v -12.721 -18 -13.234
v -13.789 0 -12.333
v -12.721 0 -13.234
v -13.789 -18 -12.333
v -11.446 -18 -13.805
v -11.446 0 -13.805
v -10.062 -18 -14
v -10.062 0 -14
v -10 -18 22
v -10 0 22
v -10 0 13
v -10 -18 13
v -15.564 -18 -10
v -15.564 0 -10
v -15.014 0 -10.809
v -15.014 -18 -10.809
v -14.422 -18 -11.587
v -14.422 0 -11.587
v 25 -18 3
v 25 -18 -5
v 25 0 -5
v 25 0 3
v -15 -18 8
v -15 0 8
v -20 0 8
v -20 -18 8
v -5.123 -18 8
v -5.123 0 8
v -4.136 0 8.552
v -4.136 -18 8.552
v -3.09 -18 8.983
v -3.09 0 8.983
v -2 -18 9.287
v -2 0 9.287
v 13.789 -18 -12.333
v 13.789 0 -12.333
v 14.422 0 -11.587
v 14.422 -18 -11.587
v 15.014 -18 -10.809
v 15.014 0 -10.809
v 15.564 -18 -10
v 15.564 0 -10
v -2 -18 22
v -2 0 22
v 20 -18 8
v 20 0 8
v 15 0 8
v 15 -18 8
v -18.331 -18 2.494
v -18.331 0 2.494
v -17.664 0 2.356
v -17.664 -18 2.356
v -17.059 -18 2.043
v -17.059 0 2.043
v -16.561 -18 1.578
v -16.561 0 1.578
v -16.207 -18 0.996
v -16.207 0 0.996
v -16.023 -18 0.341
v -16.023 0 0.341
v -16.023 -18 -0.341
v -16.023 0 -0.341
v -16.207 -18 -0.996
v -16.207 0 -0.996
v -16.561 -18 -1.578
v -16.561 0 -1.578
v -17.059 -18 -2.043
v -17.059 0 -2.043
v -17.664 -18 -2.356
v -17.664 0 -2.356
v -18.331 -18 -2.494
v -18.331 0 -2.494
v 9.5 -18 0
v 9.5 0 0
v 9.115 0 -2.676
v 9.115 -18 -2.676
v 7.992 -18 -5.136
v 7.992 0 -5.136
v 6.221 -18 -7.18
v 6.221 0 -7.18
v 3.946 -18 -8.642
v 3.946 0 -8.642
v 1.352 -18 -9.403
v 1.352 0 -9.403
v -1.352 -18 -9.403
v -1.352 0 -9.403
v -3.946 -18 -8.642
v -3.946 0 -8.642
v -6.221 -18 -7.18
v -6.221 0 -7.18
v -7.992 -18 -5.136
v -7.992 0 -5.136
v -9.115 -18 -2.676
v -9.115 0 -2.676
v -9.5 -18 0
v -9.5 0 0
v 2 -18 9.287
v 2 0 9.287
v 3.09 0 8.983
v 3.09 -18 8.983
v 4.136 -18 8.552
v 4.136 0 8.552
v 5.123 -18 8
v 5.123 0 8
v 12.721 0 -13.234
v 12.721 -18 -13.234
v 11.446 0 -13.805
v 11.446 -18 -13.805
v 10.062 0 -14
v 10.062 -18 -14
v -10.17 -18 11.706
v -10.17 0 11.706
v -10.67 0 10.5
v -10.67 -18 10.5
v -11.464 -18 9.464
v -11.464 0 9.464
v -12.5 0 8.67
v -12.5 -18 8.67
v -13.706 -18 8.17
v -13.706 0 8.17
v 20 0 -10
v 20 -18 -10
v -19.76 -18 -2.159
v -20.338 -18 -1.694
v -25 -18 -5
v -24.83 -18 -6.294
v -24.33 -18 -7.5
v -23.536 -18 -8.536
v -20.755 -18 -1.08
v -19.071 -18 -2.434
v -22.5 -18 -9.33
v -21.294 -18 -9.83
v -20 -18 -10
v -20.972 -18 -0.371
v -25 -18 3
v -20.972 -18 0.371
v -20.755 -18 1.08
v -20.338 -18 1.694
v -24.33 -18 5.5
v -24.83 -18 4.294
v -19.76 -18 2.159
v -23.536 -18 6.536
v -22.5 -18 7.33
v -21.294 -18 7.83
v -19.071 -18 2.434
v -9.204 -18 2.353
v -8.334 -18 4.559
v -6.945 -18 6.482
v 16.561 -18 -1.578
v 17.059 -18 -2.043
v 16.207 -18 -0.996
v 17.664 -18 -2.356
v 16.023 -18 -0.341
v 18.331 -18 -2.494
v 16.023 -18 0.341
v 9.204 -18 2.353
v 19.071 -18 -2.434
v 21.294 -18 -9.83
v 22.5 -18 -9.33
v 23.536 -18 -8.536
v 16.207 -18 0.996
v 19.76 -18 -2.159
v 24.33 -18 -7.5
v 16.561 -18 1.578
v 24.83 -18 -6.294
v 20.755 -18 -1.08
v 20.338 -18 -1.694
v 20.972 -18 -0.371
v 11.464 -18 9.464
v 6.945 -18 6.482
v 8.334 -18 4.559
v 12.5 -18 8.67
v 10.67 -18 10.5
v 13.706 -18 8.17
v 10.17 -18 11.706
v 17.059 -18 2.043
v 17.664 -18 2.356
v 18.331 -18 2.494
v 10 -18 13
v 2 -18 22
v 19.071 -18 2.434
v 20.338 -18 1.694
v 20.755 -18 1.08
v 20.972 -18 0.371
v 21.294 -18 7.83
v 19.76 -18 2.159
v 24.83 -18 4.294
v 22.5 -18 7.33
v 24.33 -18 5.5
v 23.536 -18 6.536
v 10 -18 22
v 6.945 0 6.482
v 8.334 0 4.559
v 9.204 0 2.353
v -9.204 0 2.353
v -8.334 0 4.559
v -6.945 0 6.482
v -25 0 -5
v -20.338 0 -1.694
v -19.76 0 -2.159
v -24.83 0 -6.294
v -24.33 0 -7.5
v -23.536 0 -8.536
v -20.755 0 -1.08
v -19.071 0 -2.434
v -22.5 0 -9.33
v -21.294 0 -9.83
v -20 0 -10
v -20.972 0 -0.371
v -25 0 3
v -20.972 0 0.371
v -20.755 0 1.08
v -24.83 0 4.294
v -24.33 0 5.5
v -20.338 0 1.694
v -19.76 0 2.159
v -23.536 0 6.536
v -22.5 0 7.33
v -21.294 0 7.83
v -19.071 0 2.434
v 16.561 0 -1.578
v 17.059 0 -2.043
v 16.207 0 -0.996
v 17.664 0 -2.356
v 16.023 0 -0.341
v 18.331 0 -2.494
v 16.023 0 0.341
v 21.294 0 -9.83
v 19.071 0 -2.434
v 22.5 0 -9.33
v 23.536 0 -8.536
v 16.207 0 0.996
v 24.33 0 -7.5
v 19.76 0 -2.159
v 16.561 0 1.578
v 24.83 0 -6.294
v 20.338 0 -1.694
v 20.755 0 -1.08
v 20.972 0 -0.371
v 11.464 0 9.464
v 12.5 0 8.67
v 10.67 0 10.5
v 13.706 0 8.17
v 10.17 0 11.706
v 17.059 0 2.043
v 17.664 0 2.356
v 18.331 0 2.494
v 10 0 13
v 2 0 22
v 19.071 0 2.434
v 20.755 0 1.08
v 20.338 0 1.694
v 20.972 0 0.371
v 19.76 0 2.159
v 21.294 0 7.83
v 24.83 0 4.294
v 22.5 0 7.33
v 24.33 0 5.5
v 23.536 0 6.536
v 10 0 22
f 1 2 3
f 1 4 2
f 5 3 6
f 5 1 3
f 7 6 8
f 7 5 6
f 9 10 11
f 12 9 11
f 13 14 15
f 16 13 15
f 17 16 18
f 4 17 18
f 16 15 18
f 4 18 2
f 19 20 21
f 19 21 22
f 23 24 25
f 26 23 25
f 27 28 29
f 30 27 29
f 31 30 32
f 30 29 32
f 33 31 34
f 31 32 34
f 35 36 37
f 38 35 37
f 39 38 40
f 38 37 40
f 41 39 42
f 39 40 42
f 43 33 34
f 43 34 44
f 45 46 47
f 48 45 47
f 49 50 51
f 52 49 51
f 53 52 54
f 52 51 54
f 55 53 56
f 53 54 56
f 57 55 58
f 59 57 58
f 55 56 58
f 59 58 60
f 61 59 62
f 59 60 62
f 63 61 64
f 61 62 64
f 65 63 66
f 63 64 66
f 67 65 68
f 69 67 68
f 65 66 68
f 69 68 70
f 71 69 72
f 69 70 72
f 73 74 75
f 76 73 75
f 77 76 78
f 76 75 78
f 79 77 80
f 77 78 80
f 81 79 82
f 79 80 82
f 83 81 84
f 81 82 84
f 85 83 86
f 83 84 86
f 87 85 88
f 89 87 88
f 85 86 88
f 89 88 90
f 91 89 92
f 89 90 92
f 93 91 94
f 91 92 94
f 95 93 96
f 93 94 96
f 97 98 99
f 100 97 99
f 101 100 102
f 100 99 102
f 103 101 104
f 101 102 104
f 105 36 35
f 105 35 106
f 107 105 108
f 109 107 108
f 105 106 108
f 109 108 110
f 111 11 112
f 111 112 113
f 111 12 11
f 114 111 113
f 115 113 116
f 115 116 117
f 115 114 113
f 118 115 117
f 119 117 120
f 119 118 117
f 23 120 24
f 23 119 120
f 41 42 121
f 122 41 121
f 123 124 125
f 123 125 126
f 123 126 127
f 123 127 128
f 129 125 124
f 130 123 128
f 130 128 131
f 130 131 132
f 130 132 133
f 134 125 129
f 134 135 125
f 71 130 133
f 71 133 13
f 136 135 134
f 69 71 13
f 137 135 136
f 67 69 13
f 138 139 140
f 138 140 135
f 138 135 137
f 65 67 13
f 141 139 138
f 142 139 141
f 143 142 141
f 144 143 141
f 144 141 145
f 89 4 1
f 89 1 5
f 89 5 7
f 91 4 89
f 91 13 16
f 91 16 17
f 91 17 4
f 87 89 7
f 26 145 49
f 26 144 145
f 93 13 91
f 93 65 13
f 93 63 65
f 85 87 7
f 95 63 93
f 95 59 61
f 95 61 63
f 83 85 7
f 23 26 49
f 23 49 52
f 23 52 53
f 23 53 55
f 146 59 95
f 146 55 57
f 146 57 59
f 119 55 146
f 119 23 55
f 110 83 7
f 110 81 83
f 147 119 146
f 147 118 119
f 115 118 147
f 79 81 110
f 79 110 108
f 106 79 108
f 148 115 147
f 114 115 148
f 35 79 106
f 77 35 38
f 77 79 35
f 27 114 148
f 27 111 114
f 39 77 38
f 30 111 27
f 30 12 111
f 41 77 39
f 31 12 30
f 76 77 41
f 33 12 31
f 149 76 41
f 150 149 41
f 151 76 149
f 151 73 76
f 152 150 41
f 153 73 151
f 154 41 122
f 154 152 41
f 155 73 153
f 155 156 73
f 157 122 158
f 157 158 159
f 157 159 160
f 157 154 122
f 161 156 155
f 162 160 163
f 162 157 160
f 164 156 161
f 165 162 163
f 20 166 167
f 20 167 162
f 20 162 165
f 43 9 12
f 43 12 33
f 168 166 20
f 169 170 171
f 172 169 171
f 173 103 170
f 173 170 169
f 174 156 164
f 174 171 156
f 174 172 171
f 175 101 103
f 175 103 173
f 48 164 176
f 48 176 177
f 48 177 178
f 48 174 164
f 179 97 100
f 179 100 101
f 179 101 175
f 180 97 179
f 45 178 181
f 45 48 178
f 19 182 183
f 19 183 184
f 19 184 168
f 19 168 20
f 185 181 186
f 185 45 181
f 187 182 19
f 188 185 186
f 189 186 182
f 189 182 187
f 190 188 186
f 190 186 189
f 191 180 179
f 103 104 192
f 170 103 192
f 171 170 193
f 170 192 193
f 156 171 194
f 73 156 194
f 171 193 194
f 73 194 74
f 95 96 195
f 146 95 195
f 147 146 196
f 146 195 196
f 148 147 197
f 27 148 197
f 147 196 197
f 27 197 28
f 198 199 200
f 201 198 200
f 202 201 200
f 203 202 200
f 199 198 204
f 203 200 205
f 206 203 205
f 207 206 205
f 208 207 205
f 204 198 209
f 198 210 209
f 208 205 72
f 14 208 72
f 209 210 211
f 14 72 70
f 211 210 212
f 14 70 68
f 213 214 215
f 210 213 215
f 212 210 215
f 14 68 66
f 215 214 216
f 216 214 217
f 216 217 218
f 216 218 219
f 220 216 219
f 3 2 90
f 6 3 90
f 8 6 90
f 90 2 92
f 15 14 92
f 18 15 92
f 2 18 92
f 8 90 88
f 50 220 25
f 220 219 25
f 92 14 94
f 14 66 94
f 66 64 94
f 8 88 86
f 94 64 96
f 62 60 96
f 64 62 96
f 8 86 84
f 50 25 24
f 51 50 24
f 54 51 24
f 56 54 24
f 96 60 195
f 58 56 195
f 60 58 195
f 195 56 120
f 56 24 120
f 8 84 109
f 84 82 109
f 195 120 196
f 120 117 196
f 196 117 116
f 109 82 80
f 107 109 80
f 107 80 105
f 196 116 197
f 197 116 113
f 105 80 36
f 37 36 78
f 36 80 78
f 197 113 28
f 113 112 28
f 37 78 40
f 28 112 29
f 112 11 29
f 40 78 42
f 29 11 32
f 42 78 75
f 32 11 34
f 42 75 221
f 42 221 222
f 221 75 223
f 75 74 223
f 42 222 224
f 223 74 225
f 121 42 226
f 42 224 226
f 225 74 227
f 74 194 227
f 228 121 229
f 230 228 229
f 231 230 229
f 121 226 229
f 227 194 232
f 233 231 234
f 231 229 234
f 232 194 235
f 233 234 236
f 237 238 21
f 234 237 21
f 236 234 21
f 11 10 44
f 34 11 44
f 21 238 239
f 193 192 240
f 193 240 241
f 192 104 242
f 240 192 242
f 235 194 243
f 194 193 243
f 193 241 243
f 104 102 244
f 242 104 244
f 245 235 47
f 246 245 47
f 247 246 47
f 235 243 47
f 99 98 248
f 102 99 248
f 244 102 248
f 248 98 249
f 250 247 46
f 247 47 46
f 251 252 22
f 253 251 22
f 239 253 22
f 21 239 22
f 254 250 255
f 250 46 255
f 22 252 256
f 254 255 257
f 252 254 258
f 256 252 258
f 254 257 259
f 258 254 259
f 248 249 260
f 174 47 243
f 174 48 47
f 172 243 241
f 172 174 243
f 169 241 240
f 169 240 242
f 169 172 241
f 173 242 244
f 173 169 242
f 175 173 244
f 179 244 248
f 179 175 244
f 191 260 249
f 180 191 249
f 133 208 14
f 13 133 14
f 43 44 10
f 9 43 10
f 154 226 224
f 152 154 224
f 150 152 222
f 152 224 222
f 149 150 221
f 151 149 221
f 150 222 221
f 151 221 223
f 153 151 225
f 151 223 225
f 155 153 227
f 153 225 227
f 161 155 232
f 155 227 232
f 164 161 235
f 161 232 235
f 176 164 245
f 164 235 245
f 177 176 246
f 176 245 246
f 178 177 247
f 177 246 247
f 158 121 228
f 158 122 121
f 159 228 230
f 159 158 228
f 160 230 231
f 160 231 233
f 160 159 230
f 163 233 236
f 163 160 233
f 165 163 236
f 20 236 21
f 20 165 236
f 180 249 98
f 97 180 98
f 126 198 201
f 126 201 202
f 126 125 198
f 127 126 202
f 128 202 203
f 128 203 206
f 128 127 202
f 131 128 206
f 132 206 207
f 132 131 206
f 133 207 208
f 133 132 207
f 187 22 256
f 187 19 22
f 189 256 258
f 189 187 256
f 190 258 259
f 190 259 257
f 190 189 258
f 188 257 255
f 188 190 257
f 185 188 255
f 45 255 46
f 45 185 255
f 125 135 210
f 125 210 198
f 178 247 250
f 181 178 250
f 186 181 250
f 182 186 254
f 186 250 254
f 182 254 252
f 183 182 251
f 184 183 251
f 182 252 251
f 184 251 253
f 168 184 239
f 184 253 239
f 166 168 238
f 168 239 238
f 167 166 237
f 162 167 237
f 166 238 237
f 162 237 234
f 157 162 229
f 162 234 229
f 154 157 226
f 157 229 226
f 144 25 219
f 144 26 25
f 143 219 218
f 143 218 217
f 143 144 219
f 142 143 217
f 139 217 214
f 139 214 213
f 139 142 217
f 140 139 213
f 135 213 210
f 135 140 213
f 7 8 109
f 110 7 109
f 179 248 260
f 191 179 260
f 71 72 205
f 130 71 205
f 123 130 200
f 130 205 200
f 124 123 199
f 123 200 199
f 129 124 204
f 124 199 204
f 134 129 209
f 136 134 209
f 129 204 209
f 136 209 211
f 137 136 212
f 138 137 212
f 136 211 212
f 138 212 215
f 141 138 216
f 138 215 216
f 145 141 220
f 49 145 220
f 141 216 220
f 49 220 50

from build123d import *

# Parameters (mm, degrees)
F1_DEPTH = 18
F2_R     = 5


with BuildPart() as f1:
    # F0 (on Front) → F1 (new body)
    with BuildSketch(Plane.XZ):
        with BuildLine():
            ThreePointArc((12.0933866224, -14), (13.9727608958, -12.1248485743), (15.5643824163, -10))
            Line((15.5643824163, -10), (-15.5643824163, -10))
            ThreePointArc((-15.5643824163, -10), (-13.9727608958, -12.1248485743), (-12.0933866224, -14))
            Line((-12.0933866224, -14), (12.0933866224, -14))
        make_face()
        with BuildLine():
            Line((25, 8), (16.6808273176, 8))
            ThreePointArc((16.6808273176, 8), (17.7210793132, 5.311623855), (18.3310810811, 2.4942867515))
            ThreePointArc((18.3310810811, 2.4942867515), (20.2070006887, 1.8265127015), (21, 0))
            ThreePointArc((21, 0), (20.2070006887, -1.8265127015), (18.3310810811, -2.4942867515))
            ThreePointArc((18.3310810811, -2.4942867515), (17.358270198, -6.3984729219), (15.5643824163, -10))
            Line((15.5643824163, -10), (25, -10))
            Line((25, -10), (25, 8))
        make_face()
        with BuildLine():
            Line((2, 22), (2, 18.3915741577))
            ThreePointArc((2, 18.3915741577), (6.1642723241, 17.4428136123), (10, 15.5643824163))
            Line((10, 15.5643824163), (10, 22))
            Line((10, 22), (2, 22))
        make_face()
        with BuildLine():
            ThreePointArc((-10, 15.5643824163), (-6.1642723241, 17.4428136123), (-2, 18.3915741577))
            Line((-2, 18.3915741577), (-2, 22))
            Line((-2, 22), (-10, 22))
            Line((-10, 22), (-10, 15.5643824163))
        make_face()
        with BuildLine():
            ThreePointArc((-18.3310810811, 2.4942867515), (-17.7210793132, 5.311623855), (-16.6808273176, 8))
            Line((-16.6808273176, 8), (-25, 8))
            Line((-25, 8), (-25, -10))
            Line((-25, -10), (-15.5643824163, -10))
            ThreePointArc((-15.5643824163, -10), (-17.358270198, -6.3984729219), (-18.3310810811, -2.4942867515))
            ThreePointArc((-18.3310810811, -2.4942867515), (-21, 0), (-18.3310810811, 2.4942867515))
        make_face()
        with BuildLine():
            ThreePointArc((2, 9.2870878105), (3.6194093636, 8.7835002054), (5.123475383, 8))
            Line((5.123475383, 8), (10, 8))
            Line((10, 8), (10, 15.5643824163))
            ThreePointArc((10, 15.5643824163), (6.1642723241, 17.4428136123), (2, 18.3915741577))
            Line((2, 18.3915741577), (2, 9.2870878105))
        make_face()
        with BuildLine():
            Line((-10, 8), (-5.123475383, 8))
            ThreePointArc((-5.123475383, 8), (-3.6194093636, 8.7835002054), (-2, 9.2870878105))
            Line((-2, 9.2870878105), (-2, 18.3915741577))
            ThreePointArc((-2, 18.3915741577), (-6.1642723241, 17.4428136123), (-10, 15.5643824163))
            Line((-10, 15.5643824163), (-10, 8))
        make_face()
        with BuildLine():
            Line((10, 0), (9.5, 0))
            ThreePointArc((9.5, 0), (0, -9.5), (-9.5, 0))
            Line((-9.5, 0), (-10, 0))
            Line((-10, 0), (-10, 8))
            Line((-10, 8), (-16.6808273176, 8))
            ThreePointArc((-16.6808273176, 8), (-17.7210793132, 5.311623855), (-18.3310810811, 2.4942867515))
            ThreePointArc((-18.3310810811, 2.4942867515), (-16.6734872985, 1.7070006887), (-16, 0))
            ThreePointArc((-16, 0), (-16.6734872985, -1.7070006887), (-18.3310810811, -2.4942867515))
            ThreePointArc((-18.3310810811, -2.4942867515), (-17.358270198, -6.3984729219), (-15.5643824163, -10))
            Line((-15.5643824163, -10), (15.5643824163, -10))
            ThreePointArc((15.5643824163, -10), (17.358270198, -6.3984729219), (18.3310810811, -2.4942867515))
            ThreePointArc((18.3310810811, -2.4942867515), (16, 0), (18.3310810811, 2.4942867515))
            ThreePointArc((18.3310810811, 2.4942867515), (17.7210793132, 5.311623855), (16.6808273176, 8))
            Line((16.6808273176, 8), (10, 8))
            Line((10, 8), (10, 0))
        make_face()
        with BuildLine():
            Line((-10, 0), (-9.5, 0))
            ThreePointArc((-9.5, 0), (-8.3343570879, 4.5594398703), (-5.123475383, 8))
            Line((-5.123475383, 8), (-10, 8))
            Line((-10, 8), (-10, 0))
        make_face()
        with BuildLine():
            ThreePointArc((5.123475383, 8), (8.3343570879, 4.5594398703), (9.5, 0))
            Line((9.5, 0), (10, 0))
            Line((10, 0), (10, 8))
            Line((10, 8), (5.123475383, 8))
        make_face()
    extrude(amount=F1_DEPTH)

    # F2
    f2_edges = [f1.edges().sort_by_distance(p)[0] for p in [
        (-25, -9, 8),
        (-25, -9, -10),
        (25, -9, -10),
        (25, -9, 8),
        (10, -9, 8),
        (-10, -9, 8),
        (-12.093387, -9, -14),
        (12.093387, -9, -14),
    ]]
    fillet(f2_edges, radius=F2_R)


solid = f1.part
